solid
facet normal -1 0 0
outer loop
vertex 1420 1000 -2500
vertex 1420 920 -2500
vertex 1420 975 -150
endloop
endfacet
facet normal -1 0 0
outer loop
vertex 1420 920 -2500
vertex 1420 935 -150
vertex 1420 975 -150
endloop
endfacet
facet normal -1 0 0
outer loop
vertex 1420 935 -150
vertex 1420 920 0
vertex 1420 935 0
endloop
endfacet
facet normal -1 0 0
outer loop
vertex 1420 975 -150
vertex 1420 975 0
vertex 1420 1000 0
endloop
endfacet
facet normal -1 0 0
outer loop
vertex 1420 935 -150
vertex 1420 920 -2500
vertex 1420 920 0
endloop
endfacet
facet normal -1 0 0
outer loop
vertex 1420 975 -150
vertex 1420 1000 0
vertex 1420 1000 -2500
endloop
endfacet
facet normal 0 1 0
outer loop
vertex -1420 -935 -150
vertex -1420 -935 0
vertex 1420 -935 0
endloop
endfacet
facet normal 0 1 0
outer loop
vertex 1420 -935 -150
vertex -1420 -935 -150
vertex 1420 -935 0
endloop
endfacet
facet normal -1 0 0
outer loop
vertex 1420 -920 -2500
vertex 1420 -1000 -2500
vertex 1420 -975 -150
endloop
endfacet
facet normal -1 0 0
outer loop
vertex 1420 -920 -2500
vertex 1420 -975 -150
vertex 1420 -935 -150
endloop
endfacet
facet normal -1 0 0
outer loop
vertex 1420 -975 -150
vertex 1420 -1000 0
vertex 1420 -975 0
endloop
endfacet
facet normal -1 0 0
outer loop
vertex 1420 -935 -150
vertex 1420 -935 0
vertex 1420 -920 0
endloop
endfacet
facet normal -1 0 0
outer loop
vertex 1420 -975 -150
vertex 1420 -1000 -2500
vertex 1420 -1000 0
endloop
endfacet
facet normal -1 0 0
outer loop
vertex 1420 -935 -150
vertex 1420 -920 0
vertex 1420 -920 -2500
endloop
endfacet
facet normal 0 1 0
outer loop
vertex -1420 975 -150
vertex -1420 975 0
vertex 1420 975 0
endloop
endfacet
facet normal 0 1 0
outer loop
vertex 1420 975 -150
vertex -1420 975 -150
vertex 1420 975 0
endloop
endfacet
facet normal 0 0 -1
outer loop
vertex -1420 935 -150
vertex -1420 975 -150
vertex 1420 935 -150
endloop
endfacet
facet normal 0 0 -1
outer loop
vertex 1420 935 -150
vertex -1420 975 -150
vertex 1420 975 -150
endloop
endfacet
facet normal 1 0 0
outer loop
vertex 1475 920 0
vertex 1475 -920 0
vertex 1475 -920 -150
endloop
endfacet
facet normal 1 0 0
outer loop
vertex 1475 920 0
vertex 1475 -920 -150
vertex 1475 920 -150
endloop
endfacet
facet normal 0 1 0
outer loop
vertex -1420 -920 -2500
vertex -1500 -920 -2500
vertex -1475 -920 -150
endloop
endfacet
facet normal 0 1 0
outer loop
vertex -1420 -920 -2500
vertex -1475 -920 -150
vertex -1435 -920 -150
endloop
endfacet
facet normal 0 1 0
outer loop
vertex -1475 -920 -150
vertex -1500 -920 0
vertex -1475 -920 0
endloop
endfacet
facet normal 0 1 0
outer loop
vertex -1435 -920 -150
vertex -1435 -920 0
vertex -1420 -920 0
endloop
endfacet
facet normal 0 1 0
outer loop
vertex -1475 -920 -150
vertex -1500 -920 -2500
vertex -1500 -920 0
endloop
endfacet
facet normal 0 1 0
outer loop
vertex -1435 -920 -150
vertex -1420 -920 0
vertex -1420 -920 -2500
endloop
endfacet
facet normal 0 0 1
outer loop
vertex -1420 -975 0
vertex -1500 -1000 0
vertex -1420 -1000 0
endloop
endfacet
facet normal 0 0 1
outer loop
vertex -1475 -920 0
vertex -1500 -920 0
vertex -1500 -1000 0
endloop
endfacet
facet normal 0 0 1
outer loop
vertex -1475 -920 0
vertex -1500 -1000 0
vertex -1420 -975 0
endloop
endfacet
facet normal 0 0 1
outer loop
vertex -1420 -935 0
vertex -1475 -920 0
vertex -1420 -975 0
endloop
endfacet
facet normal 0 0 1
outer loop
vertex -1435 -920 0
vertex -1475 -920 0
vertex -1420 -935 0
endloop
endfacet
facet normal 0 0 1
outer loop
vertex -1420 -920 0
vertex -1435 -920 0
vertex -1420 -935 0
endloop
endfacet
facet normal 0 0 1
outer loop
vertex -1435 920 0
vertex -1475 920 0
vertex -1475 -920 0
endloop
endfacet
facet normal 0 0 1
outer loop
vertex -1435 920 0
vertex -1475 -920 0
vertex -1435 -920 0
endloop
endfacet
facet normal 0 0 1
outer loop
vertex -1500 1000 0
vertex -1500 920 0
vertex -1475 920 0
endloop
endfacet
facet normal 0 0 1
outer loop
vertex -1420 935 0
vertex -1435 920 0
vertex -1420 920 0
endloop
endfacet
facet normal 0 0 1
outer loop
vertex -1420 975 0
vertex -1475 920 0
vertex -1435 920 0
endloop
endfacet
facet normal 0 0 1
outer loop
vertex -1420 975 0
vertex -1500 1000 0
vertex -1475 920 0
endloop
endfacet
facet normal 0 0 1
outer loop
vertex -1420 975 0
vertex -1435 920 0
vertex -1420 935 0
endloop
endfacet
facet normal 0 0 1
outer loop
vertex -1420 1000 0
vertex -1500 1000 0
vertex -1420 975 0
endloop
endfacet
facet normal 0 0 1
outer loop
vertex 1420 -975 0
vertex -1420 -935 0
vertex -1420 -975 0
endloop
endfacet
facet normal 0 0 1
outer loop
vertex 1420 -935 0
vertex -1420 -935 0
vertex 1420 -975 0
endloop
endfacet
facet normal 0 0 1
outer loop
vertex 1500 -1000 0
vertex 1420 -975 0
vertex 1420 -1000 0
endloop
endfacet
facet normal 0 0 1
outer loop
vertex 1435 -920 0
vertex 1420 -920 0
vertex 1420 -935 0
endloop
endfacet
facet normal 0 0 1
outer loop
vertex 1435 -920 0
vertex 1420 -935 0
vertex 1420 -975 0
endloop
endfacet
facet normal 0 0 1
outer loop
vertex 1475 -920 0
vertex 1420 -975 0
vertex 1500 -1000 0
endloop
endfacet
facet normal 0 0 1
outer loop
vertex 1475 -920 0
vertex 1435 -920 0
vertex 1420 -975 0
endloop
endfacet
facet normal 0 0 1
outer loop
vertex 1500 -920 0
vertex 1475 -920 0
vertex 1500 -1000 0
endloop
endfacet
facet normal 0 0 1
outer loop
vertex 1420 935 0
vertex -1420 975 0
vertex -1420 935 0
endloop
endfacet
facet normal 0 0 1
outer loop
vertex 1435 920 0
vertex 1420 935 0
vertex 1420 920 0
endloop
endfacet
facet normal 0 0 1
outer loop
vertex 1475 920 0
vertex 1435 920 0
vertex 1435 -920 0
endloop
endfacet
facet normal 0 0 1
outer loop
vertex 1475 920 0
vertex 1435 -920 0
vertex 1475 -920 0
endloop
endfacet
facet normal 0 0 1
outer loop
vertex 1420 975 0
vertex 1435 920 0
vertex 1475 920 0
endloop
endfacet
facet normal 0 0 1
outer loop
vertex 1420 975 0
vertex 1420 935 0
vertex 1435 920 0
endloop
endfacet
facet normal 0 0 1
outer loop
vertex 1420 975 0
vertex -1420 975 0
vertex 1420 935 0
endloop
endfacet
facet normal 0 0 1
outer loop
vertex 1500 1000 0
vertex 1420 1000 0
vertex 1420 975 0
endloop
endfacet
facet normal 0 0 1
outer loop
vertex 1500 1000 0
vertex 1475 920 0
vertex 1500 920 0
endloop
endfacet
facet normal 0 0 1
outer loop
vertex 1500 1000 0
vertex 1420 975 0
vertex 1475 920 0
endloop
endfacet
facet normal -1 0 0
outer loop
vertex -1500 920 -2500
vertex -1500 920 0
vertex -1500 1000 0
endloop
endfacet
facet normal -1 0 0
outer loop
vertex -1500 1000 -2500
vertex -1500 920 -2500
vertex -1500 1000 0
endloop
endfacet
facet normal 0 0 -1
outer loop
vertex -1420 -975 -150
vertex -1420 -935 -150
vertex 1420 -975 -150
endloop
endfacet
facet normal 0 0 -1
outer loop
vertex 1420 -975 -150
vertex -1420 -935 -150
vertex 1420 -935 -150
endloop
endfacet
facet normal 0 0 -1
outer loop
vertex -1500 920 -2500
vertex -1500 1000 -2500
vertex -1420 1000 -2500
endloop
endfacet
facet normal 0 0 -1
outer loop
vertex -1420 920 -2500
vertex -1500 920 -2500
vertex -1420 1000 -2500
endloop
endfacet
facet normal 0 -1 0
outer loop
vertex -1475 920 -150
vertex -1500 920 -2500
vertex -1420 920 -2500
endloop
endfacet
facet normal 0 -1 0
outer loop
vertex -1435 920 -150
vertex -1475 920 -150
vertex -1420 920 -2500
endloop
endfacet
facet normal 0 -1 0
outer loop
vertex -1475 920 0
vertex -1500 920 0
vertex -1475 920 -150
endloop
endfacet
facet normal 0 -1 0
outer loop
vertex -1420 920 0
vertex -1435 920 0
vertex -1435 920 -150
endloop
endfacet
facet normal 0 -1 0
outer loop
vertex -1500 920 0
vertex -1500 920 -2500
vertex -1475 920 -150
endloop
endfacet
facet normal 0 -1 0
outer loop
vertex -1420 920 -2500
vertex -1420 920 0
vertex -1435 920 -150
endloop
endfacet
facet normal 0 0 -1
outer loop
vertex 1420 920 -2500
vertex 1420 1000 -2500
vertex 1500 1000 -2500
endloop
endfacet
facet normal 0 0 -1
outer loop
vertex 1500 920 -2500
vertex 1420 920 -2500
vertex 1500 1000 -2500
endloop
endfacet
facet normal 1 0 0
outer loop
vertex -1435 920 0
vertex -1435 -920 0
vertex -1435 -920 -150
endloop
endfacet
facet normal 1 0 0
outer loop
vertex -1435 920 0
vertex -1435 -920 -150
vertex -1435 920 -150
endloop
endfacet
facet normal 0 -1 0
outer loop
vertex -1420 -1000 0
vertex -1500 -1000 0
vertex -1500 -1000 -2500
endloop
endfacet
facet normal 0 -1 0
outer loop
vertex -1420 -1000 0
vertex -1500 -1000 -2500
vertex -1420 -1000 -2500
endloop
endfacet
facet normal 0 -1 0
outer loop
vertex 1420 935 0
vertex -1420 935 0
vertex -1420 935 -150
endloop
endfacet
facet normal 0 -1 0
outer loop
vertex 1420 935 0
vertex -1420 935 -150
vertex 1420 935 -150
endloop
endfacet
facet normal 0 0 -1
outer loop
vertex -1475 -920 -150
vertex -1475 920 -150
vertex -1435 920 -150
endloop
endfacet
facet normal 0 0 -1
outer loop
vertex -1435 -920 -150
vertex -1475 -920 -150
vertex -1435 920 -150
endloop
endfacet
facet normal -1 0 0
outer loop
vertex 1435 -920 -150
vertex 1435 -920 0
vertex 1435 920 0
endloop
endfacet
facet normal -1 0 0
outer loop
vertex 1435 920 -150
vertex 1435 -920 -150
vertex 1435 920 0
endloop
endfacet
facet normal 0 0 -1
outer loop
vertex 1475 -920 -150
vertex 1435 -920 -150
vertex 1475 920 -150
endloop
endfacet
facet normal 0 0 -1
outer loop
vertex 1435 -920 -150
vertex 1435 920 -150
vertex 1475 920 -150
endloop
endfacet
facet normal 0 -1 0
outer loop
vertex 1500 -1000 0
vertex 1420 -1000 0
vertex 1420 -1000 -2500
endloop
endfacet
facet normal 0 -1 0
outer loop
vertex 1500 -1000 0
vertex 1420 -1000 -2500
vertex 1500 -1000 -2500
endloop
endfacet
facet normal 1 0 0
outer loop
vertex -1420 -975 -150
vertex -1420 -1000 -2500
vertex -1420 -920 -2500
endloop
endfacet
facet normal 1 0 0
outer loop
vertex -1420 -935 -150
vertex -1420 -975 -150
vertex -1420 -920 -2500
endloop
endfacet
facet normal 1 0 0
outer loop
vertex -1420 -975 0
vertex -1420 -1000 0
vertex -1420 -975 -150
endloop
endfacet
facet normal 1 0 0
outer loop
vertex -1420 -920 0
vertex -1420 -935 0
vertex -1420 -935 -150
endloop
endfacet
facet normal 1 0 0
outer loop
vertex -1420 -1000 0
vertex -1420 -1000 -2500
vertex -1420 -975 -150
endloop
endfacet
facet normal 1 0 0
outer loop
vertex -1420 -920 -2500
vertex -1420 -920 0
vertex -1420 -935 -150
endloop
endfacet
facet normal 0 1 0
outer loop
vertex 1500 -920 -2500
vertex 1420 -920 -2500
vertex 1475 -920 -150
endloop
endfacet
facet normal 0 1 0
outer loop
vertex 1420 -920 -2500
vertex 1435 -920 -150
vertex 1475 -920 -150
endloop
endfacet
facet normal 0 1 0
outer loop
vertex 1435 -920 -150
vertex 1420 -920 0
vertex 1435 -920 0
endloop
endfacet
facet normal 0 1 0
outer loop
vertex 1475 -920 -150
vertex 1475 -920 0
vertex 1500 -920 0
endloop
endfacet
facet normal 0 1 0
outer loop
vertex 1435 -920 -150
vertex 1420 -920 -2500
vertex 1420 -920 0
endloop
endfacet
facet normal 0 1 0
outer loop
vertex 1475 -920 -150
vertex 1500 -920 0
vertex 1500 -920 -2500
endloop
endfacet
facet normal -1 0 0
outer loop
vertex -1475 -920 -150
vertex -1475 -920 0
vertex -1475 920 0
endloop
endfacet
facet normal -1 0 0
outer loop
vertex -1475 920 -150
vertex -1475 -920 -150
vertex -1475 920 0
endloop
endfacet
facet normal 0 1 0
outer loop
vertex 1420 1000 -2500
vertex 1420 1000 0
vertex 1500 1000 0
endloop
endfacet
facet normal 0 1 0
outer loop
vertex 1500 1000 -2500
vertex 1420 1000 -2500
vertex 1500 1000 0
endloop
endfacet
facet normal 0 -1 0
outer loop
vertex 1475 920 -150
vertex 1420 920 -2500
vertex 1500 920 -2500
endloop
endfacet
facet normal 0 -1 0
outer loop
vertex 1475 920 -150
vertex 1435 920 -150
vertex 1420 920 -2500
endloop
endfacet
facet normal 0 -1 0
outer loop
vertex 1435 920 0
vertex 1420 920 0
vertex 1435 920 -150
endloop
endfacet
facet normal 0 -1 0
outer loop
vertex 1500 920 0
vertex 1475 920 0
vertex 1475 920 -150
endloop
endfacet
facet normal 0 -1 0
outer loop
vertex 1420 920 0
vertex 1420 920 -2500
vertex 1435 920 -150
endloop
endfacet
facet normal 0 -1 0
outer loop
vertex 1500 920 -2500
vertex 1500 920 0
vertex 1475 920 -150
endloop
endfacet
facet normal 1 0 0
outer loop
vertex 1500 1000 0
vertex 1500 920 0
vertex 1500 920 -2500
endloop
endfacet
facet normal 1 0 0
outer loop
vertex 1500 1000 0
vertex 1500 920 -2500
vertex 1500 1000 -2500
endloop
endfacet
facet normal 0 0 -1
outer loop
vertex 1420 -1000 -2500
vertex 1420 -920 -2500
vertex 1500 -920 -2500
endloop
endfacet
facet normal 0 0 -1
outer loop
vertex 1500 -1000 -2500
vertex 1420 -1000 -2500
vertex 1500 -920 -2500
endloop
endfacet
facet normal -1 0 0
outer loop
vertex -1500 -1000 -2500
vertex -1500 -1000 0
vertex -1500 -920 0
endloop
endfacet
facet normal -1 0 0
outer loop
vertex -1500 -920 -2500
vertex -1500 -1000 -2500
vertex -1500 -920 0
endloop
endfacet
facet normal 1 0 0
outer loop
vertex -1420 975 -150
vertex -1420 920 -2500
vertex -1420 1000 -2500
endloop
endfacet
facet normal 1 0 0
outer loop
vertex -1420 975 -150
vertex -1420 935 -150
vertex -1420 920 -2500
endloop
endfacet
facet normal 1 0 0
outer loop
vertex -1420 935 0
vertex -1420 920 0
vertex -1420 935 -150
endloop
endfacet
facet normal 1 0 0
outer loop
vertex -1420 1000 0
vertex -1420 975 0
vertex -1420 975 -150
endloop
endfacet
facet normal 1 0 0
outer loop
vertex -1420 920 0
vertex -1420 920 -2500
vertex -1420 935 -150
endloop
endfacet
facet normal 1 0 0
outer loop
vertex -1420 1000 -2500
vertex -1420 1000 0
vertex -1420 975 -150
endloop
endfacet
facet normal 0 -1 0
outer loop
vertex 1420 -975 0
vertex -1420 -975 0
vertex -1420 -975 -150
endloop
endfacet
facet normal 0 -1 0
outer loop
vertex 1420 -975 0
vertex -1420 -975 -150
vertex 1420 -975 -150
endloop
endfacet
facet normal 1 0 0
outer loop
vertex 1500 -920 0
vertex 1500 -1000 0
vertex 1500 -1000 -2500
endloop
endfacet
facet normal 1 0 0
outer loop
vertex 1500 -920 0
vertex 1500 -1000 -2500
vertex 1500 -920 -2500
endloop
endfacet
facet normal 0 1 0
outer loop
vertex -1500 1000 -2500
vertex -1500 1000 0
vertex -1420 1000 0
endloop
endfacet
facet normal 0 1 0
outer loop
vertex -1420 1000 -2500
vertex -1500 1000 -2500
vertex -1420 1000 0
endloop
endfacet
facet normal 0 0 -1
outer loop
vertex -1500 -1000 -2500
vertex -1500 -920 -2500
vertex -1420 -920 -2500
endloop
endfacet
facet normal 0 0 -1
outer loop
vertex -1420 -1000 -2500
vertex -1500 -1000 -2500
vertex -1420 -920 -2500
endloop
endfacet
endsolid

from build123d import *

# Parameters (mm, degrees)
F0_W     = 2950
F0_H     = 1950
F0_W_2   = 2870
F0_H_2   = 1870
F2_DEPTH = 150
F1_W     = 80
F1_H     = 80
F3_DEPTH = 2500


with BuildPart() as f2:
    # F0 (on Top) → F2 (new body)
    with BuildSketch(Plane.XY):
        Rectangle(F0_W, F0_H)
        Rectangle(F0_W_2, F0_H_2, mode=Mode.SUBTRACT)
    extrude(amount=-F2_DEPTH)

    # F1 (on Top) → F3 (join)
    with BuildSketch(Plane.XY):
        with Locations((1460, 960)):
            Rectangle(F1_W, F1_H)
        with Locations((1460, -960)):
            Rectangle(F1_W, F1_H)
        with Locations((-1460, -960)):
            Rectangle(F1_W, F1_H)
        with Locations((-1460, 960)):
            Rectangle(F1_W, F1_H)
    extrude(amount=-F3_DEPTH)


solid = f2.part
